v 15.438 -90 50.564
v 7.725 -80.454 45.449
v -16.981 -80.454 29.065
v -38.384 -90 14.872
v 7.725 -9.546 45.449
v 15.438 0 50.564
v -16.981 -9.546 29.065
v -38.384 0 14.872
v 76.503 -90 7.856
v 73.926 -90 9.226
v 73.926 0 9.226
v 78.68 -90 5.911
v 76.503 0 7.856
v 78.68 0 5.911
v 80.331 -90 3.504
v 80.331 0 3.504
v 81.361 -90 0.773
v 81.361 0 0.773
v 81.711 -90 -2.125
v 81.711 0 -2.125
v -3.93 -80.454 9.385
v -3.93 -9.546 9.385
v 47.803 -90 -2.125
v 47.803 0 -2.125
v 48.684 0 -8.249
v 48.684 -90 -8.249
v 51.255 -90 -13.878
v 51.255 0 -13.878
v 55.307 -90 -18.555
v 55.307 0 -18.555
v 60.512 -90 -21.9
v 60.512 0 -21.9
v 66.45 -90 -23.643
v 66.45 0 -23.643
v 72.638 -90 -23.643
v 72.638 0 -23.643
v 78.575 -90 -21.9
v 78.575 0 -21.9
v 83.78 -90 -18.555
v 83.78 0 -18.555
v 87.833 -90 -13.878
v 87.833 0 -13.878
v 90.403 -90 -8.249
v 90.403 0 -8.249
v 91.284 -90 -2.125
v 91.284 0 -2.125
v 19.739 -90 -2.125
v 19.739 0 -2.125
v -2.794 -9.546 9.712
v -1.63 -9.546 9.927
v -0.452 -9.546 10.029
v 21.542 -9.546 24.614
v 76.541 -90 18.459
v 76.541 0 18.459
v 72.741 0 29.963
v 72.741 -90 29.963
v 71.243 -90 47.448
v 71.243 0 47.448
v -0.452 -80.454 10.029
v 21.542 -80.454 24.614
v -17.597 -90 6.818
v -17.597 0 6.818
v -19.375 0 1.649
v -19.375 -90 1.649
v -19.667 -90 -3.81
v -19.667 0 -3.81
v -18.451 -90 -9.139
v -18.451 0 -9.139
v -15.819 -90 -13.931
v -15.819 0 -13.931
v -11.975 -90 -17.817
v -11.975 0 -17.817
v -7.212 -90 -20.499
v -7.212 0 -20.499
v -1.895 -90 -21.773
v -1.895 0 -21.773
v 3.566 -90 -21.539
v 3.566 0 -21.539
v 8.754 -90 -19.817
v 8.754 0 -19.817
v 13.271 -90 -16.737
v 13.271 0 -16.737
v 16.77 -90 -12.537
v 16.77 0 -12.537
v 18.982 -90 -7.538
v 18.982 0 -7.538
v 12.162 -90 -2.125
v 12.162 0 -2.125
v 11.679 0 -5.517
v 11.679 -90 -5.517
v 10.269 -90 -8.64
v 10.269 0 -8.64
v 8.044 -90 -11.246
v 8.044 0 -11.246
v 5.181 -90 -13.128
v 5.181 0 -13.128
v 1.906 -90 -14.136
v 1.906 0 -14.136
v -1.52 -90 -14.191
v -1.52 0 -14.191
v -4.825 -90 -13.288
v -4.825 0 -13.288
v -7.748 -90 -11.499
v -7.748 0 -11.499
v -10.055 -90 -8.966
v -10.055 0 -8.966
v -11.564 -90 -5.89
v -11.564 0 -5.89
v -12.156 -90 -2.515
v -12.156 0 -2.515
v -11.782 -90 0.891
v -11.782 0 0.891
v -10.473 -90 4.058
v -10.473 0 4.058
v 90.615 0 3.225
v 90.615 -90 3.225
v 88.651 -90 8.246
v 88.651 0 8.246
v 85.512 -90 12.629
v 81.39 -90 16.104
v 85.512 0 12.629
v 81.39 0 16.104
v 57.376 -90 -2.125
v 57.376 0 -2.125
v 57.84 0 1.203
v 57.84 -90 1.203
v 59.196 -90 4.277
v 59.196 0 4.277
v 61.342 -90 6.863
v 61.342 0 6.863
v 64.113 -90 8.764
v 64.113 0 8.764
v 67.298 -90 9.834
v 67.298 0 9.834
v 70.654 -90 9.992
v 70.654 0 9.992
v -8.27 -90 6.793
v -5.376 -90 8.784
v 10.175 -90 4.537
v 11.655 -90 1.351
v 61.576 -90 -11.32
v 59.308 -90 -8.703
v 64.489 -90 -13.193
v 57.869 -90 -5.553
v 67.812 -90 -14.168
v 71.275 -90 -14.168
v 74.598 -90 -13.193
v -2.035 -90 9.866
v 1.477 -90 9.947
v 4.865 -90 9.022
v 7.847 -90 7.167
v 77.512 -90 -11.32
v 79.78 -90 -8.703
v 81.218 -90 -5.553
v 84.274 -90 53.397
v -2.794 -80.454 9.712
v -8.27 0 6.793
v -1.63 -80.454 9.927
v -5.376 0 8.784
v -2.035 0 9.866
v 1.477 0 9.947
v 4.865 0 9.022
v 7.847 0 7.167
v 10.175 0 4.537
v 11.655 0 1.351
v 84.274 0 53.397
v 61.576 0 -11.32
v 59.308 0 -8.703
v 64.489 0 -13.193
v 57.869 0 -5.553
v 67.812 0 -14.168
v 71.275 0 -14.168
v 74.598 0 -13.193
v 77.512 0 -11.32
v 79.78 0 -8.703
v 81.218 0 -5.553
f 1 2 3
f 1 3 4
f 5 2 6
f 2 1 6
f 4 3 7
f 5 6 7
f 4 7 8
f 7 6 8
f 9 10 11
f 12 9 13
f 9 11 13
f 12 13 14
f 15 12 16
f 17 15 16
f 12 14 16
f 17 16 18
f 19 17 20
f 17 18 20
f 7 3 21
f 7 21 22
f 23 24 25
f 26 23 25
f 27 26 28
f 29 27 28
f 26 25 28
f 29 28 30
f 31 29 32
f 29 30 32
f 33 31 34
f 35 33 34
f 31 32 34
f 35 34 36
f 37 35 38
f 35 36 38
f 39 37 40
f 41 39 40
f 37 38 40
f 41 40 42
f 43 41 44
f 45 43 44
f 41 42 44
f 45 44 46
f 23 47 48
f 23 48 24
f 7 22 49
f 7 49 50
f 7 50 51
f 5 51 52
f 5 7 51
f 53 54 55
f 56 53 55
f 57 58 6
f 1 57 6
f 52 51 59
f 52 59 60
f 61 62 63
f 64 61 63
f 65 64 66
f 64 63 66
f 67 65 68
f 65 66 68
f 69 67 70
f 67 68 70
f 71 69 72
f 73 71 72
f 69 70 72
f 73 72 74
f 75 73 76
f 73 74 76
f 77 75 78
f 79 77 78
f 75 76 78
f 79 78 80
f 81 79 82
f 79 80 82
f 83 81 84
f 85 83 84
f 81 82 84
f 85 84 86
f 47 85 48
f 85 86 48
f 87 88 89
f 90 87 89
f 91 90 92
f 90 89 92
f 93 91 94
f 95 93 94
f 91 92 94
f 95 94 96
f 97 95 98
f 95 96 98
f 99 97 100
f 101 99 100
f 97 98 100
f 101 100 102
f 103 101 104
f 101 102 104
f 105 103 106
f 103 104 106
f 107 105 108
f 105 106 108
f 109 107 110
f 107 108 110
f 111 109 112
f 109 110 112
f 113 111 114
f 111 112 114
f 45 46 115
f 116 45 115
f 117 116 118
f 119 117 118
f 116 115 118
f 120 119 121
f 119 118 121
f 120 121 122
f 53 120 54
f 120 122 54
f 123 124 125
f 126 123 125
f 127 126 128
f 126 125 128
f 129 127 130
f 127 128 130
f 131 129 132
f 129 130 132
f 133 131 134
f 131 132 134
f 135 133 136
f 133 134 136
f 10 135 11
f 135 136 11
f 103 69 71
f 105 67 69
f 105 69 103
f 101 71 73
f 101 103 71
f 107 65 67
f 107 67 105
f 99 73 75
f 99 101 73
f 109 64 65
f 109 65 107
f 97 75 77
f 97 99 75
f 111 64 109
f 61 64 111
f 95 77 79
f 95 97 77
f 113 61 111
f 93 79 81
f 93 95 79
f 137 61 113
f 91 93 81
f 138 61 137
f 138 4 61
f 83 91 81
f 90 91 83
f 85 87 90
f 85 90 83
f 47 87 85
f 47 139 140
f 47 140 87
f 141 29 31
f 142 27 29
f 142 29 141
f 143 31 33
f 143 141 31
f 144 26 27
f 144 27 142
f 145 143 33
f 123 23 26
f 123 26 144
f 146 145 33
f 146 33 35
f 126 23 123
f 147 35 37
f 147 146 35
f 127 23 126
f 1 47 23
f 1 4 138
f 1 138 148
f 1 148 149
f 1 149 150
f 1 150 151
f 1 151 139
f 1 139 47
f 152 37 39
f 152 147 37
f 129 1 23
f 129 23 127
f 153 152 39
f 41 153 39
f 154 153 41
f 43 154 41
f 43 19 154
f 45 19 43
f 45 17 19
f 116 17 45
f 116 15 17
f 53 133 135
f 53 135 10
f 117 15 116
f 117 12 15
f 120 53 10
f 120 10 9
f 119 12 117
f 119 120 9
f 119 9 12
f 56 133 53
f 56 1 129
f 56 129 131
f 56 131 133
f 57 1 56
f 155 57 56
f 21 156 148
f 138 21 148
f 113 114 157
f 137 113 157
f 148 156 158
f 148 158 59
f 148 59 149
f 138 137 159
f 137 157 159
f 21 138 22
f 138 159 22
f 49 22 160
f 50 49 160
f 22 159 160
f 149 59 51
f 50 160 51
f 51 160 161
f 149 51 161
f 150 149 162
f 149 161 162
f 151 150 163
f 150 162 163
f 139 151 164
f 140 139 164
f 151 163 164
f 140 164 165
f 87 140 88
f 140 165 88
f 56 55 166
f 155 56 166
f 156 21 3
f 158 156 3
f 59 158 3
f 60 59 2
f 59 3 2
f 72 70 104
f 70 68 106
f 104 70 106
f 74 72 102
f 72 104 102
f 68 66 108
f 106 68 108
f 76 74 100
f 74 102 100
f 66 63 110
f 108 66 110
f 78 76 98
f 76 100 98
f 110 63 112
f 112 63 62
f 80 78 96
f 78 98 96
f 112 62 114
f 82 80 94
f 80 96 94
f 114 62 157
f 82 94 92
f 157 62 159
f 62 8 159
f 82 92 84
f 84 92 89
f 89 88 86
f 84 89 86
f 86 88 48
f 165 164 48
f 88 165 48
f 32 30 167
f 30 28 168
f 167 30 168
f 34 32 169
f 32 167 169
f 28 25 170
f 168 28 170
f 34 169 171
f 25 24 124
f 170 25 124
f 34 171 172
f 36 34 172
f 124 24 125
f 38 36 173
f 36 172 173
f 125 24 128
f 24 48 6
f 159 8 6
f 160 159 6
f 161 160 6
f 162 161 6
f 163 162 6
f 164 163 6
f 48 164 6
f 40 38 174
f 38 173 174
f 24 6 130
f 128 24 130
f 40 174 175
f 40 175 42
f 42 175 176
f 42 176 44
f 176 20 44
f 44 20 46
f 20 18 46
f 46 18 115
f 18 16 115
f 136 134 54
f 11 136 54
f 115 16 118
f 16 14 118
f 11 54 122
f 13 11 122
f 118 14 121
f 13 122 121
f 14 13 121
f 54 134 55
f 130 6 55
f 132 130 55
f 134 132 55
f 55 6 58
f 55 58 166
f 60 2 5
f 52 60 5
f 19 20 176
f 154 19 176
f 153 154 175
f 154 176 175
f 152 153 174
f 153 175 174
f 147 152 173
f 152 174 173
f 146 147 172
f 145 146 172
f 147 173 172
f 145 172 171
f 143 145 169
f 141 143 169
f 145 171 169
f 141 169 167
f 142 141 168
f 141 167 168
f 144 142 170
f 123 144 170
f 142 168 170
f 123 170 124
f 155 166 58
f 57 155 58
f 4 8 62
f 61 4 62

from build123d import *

# Parameters (mm, degrees)
F1_DEPTH = 90
F2_W     = 29.6450741589
F2_H     = 70.9077940881
F3_DEPTH = 25


with BuildPart() as f1:
    # F0 (on Front) → F1 (new body)
    with BuildSketch(Plane.XZ):
        with BuildLine():
            Line((19.7393086681, -2.1245502867), (12.1618005228, -2.1245502867))
            ThreePointArc((12.1618005228, -2.1245502867), (-3.2044417421, -13.8565980652), (-10.4731612691, 4.0578671196))
            Line((-10.4731612691, 4.0578671196), (-17.5973851442, 6.8181754041))
            ThreePointArc((-17.5973851442, 6.8181754041), (-4.5978304439, -21.3209109289), (19.7393086681, -2.1245502867))
        make_face()
        with BuildLine():
            ThreePointArc((-17.5973851442, 6.8181754041), (4.5978304439, 17.0718103555), (19.7393086681, -2.1245502867))
            Line((19.7393086681, -2.1245502867), (47.8034389698, -2.1245502867))
            ThreePointArc((47.8034389698, -2.1245502867), (56.8842174331, 15.549580718), (76.5405482344, 18.4588939876))
            Line((76.5405482344, 18.4588939876), (72.7407261729, 29.9625266343))
            Line((72.7407261729, 29.9625266343), (84.2738300562, 53.3970333636))
            Line((84.2738300562, 53.3970333636), (71.2432563305, 47.4482923746))
            Line((71.2432563305, 47.4482923746), (15.4384011403, 50.5643002689))
            Line((15.4384011403, 50.5643002689), (-38.3835434914, 14.8718534037))
            Line((-38.3835434914, 14.8718534037), (-17.5973851442, 6.8181754041))
        make_face()
        with BuildLine():
            Line((57.3760422717, -2.1245502867), (47.8034389698, -2.1245502867))
            ThreePointArc((47.8034389698, -2.1245502867), (69.5436149836, -23.8647263004), (91.2837909973, -2.1245502867))
            ThreePointArc((91.2837909973, -2.1245502867), (87.2177459882, 10.5348472637), (76.5405482344, 18.4588939876))
            Line((76.5405482344, 18.4588939876), (76.9786015153, 17.1327255666))
            Line((76.9786015153, 17.1327255666), (73.9260684349, 9.2263936144))
            ThreePointArc((73.9260684349, 9.2263936144), (79.5778973875, 4.7575280576), (81.7111876954, -2.1245502867))
            ThreePointArc((81.7111876954, -2.1245502867), (69.5436149836, -14.2921229985), (57.3760422717, -2.1245502867))
        make_face()
        with BuildLine():
            ThreePointArc((-10.4731612691, 4.0578671196), (3.2044417421, 9.6074974918), (12.1618005228, -2.1245502867))
            Line((12.1618005228, -2.1245502867), (19.7393086681, -2.1245502867))
            ThreePointArc((19.7393086681, -2.1245502867), (4.5978304439, 17.0718103555), (-17.5973851442, 6.8181754041))
            Line((-17.5973851442, 6.8181754041), (-10.4731612691, 4.0578671196))
        make_face()
        with BuildLine():
            ThreePointArc((76.5405482344, 18.4588939876), (56.8842174331, 15.549580718), (47.8034389698, -2.1245502867))
            Line((47.8034389698, -2.1245502867), (57.3760422717, -2.1245502867))
            ThreePointArc((57.3760422717, -2.1245502867), (62.6615366393, 7.9097321173), (73.9260684349, 9.2263936144))
            Line((73.9260684349, 9.2263936144), (76.9786015153, 17.1327255666))
            Line((76.9786015153, 17.1327255666), (76.5405482344, 18.4588939876))
        make_face()
    extrude(amount=F1_DEPTH)

    # F2 (on face) → F3 (cut)
    with BuildSketch(Plane(origin=(-18.5741359404, 0, 28.0086181803), x_dir=(0.8333974675, 0, 0.5526741003), z_dir=(-0.5526741003, 0, 0.8333974675))):
        with Locations((16.7337115854, -45)):
            Rectangle(F2_W, F2_H)
    extrude(amount=-F3_DEPTH, mode=Mode.SUBTRACT)


solid = f1.part
